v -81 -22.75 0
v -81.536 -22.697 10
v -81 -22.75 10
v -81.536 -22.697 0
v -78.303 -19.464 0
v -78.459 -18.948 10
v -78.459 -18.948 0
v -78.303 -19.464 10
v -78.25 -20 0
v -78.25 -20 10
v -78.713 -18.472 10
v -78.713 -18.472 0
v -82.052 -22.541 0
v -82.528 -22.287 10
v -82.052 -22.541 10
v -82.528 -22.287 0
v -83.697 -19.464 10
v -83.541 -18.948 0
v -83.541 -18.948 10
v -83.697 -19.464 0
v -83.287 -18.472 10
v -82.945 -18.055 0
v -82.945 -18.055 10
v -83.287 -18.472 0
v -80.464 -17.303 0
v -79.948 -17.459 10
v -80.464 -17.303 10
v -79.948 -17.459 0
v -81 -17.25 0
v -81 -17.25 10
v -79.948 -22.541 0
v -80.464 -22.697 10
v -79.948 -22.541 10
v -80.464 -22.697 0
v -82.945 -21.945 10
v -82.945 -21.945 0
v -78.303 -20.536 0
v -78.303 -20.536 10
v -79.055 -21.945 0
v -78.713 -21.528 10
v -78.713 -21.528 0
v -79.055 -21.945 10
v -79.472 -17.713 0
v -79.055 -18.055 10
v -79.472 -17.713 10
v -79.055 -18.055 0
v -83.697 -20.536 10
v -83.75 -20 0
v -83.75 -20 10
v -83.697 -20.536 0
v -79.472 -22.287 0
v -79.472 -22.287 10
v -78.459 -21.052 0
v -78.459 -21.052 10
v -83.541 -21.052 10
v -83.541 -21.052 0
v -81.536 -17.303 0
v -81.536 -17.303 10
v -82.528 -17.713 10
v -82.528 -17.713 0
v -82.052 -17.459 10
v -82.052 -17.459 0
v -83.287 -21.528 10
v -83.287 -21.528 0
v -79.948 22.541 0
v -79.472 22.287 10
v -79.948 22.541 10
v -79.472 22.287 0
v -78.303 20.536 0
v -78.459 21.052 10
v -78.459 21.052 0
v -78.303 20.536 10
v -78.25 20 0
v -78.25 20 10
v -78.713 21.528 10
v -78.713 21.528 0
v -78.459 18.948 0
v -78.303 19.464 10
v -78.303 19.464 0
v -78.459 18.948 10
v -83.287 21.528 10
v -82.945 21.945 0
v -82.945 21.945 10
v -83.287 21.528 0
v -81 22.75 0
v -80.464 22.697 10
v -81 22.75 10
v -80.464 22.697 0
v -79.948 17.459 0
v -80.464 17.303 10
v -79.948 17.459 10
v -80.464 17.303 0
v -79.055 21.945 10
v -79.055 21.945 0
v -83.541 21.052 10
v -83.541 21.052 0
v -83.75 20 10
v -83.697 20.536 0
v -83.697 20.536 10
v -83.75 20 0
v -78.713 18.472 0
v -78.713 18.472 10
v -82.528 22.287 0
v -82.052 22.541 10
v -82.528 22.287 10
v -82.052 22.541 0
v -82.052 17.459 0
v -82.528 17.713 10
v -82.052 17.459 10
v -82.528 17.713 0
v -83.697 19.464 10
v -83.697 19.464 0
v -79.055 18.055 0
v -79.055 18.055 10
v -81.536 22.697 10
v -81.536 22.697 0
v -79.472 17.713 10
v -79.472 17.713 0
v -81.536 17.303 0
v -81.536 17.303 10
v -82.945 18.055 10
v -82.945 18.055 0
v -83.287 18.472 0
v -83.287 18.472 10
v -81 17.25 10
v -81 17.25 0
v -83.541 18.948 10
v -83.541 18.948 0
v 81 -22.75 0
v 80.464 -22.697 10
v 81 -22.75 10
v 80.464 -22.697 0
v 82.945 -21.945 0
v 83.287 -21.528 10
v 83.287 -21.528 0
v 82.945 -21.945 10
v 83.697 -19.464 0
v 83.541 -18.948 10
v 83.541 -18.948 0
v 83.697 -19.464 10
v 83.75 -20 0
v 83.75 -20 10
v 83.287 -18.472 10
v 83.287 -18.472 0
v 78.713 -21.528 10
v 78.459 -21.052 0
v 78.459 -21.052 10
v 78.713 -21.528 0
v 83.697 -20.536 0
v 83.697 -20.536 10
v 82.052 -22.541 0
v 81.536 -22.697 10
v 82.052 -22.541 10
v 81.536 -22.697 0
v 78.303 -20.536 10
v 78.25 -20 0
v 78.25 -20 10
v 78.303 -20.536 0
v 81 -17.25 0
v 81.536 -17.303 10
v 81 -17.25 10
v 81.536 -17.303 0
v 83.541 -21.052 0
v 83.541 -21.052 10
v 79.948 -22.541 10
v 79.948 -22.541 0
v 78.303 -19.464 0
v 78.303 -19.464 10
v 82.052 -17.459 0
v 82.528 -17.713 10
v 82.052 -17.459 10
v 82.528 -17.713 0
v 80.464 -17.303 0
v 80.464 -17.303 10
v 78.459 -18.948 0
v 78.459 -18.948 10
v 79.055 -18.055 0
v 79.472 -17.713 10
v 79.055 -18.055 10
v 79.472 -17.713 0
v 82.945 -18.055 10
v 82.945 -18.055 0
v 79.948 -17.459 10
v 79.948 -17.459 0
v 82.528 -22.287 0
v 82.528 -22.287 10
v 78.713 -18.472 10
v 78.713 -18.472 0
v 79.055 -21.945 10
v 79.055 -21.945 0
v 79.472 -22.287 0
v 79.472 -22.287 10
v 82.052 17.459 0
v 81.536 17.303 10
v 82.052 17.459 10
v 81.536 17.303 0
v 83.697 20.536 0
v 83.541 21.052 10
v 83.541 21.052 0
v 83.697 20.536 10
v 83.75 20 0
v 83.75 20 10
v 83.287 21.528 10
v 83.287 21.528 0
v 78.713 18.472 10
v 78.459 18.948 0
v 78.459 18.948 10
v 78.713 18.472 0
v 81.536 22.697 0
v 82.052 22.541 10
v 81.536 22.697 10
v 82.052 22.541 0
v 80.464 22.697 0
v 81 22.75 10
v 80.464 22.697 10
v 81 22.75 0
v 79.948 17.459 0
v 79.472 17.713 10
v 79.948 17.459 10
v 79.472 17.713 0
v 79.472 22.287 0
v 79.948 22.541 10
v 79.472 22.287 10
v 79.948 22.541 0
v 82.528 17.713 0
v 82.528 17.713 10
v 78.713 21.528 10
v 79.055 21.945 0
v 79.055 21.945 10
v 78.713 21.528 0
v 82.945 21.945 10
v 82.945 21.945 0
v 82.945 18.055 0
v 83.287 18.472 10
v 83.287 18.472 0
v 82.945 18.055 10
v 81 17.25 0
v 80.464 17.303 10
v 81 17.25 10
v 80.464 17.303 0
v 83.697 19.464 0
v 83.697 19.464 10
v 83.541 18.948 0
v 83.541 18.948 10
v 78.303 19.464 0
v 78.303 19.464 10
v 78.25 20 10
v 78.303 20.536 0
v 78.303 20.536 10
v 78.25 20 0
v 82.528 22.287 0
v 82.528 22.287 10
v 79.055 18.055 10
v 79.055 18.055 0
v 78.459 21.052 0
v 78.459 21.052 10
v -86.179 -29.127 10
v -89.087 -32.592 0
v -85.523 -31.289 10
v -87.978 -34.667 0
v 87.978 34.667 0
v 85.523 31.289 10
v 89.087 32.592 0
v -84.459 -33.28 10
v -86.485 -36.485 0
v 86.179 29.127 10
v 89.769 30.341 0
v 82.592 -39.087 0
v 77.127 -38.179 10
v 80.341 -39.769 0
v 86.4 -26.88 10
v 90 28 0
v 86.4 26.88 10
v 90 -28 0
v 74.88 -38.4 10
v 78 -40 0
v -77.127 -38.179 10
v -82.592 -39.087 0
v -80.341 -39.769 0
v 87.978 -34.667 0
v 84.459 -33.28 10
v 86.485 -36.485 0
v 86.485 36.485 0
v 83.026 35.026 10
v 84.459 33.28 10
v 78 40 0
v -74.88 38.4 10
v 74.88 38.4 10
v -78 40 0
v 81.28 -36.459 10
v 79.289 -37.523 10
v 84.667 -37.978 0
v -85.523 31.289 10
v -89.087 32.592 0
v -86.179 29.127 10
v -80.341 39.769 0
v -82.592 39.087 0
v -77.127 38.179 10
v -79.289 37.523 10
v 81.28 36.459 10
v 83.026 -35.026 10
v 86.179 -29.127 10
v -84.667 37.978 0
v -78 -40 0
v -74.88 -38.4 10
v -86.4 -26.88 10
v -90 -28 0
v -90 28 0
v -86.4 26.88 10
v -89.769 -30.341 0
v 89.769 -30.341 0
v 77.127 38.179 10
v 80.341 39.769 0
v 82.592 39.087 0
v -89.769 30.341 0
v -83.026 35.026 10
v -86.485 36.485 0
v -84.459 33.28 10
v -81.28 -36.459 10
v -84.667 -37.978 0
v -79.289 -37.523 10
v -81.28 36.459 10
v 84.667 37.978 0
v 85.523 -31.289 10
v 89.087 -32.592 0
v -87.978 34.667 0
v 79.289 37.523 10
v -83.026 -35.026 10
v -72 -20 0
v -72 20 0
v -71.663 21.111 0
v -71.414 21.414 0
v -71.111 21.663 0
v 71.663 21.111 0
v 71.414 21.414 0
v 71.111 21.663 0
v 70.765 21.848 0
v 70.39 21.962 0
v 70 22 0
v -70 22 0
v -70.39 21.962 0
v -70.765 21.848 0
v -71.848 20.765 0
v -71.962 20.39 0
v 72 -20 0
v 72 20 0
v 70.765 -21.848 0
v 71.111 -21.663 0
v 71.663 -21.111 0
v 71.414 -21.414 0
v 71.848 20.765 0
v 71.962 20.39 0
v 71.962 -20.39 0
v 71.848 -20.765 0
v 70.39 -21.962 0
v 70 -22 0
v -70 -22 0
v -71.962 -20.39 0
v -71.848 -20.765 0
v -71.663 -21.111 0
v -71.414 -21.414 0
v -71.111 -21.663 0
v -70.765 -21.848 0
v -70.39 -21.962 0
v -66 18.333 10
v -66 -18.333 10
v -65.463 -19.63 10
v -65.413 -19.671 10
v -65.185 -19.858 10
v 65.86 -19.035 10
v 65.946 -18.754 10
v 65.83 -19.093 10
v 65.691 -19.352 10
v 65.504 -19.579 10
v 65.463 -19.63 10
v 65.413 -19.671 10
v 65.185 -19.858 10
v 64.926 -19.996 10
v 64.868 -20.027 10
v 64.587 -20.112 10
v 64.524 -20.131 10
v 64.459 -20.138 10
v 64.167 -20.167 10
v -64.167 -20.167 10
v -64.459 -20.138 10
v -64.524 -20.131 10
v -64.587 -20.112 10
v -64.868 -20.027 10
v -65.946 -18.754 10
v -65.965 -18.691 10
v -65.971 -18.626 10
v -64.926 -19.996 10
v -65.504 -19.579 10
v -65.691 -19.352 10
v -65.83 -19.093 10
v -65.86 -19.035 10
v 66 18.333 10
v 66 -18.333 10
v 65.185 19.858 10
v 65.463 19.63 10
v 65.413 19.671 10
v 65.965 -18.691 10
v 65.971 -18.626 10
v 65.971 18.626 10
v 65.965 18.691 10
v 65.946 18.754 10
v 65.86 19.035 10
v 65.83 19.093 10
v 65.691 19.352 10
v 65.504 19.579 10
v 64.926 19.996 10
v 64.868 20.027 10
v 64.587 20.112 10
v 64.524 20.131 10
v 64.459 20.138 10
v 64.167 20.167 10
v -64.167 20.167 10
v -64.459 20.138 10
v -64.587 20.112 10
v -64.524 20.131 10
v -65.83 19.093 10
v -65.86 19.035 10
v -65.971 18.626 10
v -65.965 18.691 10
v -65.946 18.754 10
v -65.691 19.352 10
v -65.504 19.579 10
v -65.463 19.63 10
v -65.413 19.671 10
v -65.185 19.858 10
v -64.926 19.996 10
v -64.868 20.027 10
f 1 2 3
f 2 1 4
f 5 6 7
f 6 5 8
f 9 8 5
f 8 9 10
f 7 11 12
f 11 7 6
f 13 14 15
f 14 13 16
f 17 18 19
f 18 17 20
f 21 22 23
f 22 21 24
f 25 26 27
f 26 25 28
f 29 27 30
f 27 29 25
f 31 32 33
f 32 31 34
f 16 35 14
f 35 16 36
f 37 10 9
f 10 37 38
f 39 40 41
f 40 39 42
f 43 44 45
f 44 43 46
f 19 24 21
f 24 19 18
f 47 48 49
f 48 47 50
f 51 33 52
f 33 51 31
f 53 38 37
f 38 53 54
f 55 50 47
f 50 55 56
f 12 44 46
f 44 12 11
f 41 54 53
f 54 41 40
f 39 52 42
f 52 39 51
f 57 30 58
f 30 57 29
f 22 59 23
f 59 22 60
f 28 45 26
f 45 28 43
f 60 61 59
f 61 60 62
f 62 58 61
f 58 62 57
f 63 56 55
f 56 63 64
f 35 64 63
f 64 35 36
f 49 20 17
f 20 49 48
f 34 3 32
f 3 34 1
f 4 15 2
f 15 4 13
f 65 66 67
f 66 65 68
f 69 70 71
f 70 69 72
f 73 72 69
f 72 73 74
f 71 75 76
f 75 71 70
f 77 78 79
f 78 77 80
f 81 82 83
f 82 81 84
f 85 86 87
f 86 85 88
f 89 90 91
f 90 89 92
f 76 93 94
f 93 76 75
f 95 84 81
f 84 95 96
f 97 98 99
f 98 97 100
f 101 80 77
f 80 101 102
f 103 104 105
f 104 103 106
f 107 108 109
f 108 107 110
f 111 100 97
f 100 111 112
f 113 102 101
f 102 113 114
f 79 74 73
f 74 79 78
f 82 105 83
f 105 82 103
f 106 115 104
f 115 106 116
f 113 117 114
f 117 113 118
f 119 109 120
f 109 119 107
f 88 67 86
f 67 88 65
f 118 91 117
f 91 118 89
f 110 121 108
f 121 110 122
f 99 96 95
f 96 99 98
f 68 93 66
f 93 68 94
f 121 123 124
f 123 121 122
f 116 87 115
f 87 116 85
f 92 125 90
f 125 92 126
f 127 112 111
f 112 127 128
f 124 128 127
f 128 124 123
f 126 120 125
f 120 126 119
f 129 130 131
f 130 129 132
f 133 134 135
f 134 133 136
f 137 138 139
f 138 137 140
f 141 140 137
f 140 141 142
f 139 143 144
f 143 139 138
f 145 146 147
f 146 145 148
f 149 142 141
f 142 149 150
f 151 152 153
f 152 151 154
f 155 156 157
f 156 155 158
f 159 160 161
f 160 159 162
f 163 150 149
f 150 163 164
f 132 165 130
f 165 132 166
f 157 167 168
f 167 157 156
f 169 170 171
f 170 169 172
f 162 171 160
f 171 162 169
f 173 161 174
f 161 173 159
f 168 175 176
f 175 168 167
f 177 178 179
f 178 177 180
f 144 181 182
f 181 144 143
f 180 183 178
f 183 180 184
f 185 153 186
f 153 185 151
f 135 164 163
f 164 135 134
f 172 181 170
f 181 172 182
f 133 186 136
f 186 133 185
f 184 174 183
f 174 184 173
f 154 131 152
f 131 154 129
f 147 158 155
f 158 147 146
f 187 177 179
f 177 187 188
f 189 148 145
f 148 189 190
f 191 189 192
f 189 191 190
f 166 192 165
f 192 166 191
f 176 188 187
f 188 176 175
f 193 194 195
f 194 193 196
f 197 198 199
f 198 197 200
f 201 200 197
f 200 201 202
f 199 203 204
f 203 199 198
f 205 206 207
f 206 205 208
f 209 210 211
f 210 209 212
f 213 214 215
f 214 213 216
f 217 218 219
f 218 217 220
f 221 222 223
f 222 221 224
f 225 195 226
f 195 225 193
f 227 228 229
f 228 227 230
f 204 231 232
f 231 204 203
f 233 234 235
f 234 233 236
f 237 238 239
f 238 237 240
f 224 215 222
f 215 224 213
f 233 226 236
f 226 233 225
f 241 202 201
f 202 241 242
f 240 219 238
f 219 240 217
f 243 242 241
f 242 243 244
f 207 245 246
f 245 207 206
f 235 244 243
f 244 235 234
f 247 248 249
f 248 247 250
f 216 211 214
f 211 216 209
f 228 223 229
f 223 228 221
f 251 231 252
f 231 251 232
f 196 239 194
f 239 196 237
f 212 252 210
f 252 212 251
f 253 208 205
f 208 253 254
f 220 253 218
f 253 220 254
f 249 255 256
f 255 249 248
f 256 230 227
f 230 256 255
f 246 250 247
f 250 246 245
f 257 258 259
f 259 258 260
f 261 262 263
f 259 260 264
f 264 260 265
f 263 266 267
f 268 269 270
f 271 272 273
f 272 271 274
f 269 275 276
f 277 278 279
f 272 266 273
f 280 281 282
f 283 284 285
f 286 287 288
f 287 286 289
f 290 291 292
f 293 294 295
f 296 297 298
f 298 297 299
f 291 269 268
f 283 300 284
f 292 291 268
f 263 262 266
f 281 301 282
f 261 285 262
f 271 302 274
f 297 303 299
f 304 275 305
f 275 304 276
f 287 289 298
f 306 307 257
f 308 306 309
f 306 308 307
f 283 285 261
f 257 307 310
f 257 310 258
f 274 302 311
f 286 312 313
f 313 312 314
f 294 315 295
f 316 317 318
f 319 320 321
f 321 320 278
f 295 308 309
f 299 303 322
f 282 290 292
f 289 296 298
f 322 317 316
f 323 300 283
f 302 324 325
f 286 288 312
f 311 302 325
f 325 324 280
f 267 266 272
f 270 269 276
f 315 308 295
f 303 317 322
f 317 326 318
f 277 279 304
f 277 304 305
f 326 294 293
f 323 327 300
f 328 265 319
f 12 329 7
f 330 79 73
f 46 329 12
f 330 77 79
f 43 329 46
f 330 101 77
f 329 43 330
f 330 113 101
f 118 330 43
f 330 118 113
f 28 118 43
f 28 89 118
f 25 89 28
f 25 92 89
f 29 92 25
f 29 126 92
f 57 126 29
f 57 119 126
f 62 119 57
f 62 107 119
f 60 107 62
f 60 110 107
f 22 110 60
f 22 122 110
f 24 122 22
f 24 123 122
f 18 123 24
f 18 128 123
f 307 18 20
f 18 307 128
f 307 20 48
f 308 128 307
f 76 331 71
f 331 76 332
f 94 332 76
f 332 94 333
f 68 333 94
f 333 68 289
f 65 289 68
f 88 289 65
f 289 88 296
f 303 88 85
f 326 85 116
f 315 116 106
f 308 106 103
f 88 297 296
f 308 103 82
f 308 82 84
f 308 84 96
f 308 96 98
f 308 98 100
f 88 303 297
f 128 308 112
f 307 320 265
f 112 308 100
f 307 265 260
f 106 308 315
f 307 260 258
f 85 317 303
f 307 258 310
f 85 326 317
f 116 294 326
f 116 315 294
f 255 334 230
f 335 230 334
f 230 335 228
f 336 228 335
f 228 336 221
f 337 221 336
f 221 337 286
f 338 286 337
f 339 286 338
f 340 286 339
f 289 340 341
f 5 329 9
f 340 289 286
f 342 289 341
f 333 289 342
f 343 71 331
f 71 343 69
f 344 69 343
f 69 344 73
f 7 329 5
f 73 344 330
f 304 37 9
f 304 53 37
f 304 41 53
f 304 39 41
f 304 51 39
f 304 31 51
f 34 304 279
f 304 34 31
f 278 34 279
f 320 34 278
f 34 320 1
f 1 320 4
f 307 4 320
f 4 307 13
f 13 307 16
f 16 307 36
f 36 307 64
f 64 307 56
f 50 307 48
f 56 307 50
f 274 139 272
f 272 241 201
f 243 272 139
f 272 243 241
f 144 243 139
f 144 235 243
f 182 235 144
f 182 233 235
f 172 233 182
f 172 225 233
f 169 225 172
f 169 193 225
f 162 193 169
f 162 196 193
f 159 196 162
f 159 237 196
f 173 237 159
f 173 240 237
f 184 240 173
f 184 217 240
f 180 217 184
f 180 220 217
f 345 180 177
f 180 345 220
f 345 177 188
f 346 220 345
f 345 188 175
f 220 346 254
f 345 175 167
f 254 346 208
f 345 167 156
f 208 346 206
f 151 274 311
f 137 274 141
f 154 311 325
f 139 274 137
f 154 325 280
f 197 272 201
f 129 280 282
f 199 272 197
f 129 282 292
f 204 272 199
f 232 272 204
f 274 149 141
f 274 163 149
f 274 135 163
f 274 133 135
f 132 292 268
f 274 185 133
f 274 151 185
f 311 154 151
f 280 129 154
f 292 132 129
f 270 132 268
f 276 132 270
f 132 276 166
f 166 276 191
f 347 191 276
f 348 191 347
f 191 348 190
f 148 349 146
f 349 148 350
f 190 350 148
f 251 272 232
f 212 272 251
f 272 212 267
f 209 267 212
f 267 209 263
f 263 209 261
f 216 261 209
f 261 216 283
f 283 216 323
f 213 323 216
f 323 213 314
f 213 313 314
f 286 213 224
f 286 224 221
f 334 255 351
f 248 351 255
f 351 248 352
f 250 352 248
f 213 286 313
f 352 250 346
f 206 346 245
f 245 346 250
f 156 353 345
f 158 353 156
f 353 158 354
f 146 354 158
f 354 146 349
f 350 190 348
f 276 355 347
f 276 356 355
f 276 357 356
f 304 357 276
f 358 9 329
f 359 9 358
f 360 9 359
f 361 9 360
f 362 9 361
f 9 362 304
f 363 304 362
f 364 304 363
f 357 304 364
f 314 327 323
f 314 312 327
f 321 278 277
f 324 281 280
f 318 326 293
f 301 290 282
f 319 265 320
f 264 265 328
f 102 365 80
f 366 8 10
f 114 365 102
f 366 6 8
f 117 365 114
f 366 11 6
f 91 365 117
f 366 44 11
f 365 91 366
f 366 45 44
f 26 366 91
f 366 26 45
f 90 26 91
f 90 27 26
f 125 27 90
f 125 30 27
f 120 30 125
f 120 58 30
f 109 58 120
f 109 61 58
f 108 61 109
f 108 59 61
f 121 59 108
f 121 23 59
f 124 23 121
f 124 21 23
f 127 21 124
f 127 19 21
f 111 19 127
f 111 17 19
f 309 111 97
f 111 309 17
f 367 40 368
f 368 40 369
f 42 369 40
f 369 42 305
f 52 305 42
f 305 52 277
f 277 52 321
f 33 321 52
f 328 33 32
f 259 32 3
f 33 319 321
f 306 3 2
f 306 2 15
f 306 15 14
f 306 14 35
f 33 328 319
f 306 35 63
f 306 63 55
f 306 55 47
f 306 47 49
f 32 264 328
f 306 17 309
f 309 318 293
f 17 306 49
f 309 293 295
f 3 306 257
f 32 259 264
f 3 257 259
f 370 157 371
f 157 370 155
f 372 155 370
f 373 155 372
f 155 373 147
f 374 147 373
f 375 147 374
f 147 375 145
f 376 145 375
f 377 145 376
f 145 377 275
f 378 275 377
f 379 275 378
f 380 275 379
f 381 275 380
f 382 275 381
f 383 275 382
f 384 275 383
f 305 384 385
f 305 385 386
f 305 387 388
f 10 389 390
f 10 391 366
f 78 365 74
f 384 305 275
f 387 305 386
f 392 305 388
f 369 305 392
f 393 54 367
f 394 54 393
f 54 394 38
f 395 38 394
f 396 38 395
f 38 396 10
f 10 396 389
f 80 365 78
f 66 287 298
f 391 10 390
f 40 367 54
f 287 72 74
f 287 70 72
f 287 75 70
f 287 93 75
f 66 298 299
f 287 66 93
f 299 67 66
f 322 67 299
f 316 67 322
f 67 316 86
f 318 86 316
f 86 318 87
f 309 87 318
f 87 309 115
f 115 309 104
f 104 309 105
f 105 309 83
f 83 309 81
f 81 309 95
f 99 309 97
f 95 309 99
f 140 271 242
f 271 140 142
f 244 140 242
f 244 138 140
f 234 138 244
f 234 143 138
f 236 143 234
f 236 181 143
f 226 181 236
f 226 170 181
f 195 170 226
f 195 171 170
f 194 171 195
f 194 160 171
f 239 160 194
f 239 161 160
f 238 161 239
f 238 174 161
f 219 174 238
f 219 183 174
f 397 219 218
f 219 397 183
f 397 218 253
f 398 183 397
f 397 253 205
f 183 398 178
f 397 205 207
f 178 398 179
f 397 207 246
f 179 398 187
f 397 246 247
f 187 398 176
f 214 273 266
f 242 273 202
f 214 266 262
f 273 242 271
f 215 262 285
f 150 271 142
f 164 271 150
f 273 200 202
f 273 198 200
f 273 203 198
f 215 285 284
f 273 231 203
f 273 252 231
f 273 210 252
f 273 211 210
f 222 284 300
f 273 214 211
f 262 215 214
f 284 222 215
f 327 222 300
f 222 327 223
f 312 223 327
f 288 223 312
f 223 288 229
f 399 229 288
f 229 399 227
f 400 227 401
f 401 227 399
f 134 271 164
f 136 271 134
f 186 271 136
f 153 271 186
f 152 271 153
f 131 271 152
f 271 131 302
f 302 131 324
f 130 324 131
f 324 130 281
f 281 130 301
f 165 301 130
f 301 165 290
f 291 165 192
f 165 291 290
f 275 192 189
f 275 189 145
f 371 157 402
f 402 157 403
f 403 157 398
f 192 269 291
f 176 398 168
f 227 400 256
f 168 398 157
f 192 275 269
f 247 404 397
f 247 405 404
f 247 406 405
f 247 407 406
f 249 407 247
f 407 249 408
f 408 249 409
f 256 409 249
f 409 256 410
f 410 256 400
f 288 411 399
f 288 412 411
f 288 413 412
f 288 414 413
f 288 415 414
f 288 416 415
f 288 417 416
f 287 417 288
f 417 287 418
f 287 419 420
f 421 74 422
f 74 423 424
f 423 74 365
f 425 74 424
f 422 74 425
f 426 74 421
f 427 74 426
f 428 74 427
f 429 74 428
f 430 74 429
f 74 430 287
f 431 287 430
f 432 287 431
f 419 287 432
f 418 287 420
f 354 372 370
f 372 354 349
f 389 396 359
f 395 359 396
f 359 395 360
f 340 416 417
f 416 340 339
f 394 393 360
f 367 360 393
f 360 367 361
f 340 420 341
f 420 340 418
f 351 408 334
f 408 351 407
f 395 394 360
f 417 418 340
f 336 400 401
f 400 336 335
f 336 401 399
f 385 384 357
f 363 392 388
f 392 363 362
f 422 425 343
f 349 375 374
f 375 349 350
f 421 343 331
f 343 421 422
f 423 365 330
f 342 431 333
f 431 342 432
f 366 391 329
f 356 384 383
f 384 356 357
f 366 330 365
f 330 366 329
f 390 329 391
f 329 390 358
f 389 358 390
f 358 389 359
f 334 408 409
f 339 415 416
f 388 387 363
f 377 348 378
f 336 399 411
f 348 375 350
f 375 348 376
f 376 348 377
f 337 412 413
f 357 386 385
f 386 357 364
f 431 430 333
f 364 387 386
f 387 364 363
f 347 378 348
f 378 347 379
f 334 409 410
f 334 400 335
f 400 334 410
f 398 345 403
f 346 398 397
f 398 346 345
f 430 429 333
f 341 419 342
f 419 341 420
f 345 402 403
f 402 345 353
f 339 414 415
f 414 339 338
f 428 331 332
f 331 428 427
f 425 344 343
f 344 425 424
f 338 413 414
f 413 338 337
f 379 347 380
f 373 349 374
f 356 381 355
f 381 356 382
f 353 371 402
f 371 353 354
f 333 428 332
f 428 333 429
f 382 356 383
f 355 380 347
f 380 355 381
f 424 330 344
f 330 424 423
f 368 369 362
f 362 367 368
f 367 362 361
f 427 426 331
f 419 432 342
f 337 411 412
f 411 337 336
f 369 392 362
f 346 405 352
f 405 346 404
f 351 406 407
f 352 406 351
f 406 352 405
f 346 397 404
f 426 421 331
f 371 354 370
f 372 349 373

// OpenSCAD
$fn = 32;

// ----------------------------------------------------------------------
// Display bezel: 180 x 80 mm frame, opening 144x44 mm
// ----------------------------------------------------------------------

// --- parameters (mm) ---
length = 180;             // frame outside length, X
width = 80;               // frame outside width, Y
frame_w = 18;             // frame width
thickness = 10;           // frame thickness
corner_r = 12;            // outside corner radius
chamfer = 0.96;           // outer wall taper
funnel = 0.9;             // inner opening taper
opening_l = 144;          // opening length
opening_w = 44;           // opening width
inner_r = 2;              // opening corner radius
hole_d = 5.5;             // mounting screw clearance
holes_per_side = 2;       // holes per short side
hole_inset = 9;           // hole centre inset from the outside edge

/* rounded-rectangle outlines, generated with loops */
module rounded_ring(l_nom, w_nom, r) {
  hull() {
    for (sx = [-1, 1]) for (sy = [-1, 1])
      translate([sx * (l_nom / 2 - r), sy * (w_nom / 2 - r)]) circle(r = r);
  }
}

difference() {
  /* frame body, drafted so the outer edge is a variable-depth chamfer */
  linear_extrude(height = thickness, scale = chamfer)
    rounded_ring(length, width, corner_r);
  /* viewing opening, drafted the other way for a funnel edge */
  linear_extrude(height = thickness + 2, scale = funnel)
    translate([0, 0, -1]) rounded_ring(opening_l, opening_w, inner_r);
  /* mounting screws through the frame lands */
  for (sx = [-1, 1]) for (i = [1 : holes_per_side])
    translate([sx * (length / 2 - hole_inset),
               (i - (holes_per_side + 1) / 2) * width * 0.5, -1])
      cylinder(h = thickness + 2, d = hole_d);
}
